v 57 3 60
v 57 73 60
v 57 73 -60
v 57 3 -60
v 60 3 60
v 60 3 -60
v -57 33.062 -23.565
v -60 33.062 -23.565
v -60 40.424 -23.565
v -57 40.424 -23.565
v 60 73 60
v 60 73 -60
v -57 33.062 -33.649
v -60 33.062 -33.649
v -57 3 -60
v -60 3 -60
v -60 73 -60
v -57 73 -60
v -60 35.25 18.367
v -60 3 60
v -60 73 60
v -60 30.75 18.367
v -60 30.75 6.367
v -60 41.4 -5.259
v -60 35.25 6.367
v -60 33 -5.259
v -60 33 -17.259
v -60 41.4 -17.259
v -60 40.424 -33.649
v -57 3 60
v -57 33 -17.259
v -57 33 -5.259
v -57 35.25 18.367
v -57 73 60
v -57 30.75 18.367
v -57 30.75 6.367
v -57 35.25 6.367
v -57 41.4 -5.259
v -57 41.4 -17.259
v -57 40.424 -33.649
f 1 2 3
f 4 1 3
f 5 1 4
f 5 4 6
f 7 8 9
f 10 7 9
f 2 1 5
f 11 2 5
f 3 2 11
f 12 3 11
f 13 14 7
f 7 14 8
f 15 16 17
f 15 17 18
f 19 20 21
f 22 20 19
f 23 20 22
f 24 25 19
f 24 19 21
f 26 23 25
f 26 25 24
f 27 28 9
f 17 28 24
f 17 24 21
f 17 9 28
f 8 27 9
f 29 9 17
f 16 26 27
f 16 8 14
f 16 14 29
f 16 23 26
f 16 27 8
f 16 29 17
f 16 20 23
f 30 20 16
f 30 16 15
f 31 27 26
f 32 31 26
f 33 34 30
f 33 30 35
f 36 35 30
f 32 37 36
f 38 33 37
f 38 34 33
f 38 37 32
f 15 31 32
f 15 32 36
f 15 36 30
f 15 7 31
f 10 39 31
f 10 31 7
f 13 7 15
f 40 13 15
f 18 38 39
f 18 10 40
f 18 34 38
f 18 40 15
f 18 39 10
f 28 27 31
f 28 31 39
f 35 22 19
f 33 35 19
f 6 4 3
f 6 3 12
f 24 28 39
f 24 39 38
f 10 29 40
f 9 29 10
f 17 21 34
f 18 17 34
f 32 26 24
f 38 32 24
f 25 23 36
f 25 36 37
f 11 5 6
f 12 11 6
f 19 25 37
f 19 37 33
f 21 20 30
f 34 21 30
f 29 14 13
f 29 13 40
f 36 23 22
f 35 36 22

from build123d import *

# Parameters (mm, degrees)
SKETCH1_W           = 140
SKETCH1_H           = 160
BOSS_EXTRUDE1_DEPTH = 3
SKETCH2_W           = 120
SKETCH2_H           = 120
SKETCH2_W_2         = 114
SKETCH2_H_2         = 114
BOSS_EXTRUDE2_DEPTH = 70
SKETCH4_W           = 120
SKETCH4_H           = 120
BOSS_EXTRUDE4_DEPTH = 3
SKETCH5_R           = 2.1
SKETCH5_W           = 39.9
SKETCH5_H           = 19.71
CUT_EXTRUDE2_DEPTH  = 3
SKETCH6_W           = 18.298163042
SKETCH6_H           = 17.309993256
CUT_EXTRUDE3_DEPTH  = 3
CUT_EXTRUDE8_DEPTH  = 5
SKETCH15_W          = 259.021634325
SKETCH15_H          = 180.269434884
BOSS_EXTRUDE5_DEPTH = 3
SKETCH18_R          = 1.6
CUT_EXTRUDE9_DEPTH  = 10
SKETCH19_W          = 12
SKETCH19_H          = 4.5
SKETCH19_H_2        = 8.4
SKETCH19_W_2        = 10.084057066
SKETCH19_H_3        = 7.362028533
CUT_EXTRUDE11_DEPTH = 5
SKETCH20_W          = 263.921538054
SKETCH20_H          = 19.630552878
SKETCH20_W_2        = 120
SKETCH20_H_2        = 3
CUT_EXTRUDE12_DEPTH = 233.259150239
SKETCH21_W          = 259.021634325
SKETCH21_H          = 40.269434884
CUT_EXTRUDE13_DEPTH = 209.619923406
SKETCH22_W          = 114
SKETCH22_H          = 125.782417664
CUT_EXTRUDE14_DEPTH = 111


with BuildPart() as part:
    # Sketch1 → Boss-Extrude1 (new body)
    with BuildSketch(Plane(origin=(0, 0, 0), x_dir=(1, 0, 0), z_dir=(0, 1, 0))):
        Rectangle(SKETCH1_W, SKETCH1_H)
    extrude(amount=BOSS_EXTRUDE1_DEPTH)

    # Sketch2 → Boss-Extrude2 (add)
    with BuildSketch(Plane(origin=(0, 3, 0), x_dir=(1, 0, 0), z_dir=(0, 1, 0))):
        Rectangle(SKETCH2_W, SKETCH2_H)
        Rectangle(SKETCH2_W_2, SKETCH2_H_2, mode=Mode.SUBTRACT)
    extrude(amount=BOSS_EXTRUDE2_DEPTH)

    # Sketch4 → Boss-Extrude4 (add)
    with BuildSketch(Plane(origin=(0, 73, 0), x_dir=(1, 0, 0), z_dir=(0, 1, 0))):
        Rectangle(SKETCH4_W, SKETCH4_H)
    extrude(amount=BOSS_EXTRUDE4_DEPTH)

    # Sketch5 → Cut-Extrude2 (cut)
    with BuildSketch(Plane(origin=(0, 76, 0), x_dir=(1, 0, 0), z_dir=(0, 1, 0))):
        with Locations(Location((34.39, -4.925, 0), (0, 0, 270))):
            Circle(SKETCH5_R)
        with Locations(Location((34.39, 4.925, 0), (0, 0, 270))):
            Circle(SKETCH5_R)
        with Locations(Location((-15.03, -4.925, 0), (0, 0, 270))):
            Circle(SKETCH5_R)
        with Locations(Location((-15.03, 4.925, 0), (0, 0, 270))):
            Circle(SKETCH5_R)
        with Locations((9.68, 0)):
            Rectangle(SKETCH5_W, SKETCH5_H)
    extrude(amount=-CUT_EXTRUDE2_DEPTH, mode=Mode.SUBTRACT)

    # Sketch6 → Cut-Extrude3 (cut)
    with BuildSketch(Plane(origin=(0, 76, 0), x_dir=(1, 0, 0), z_dir=(0, 1, 0))):
        Rectangle(SKETCH6_W, SKETCH6_H)
    extrude(amount=-CUT_EXTRUDE3_DEPTH, mode=Mode.SUBTRACT)

    # Sketch13 → Cut-Extrude8 (cut)
    with BuildSketch(Plane(origin=(0, 76, 0), x_dir=(1, 0, 0), z_dir=(0, 1, 0))):
        with BuildLine():
            ThreePointArc((-3.792582359, 49.728765052), (-53.491503795, -1.722579942), (-0.349490011, -49.609426409))
            ThreePointArc((-0.349490011, -49.609426409), (5.82592347, -42.51288634), (-1.270616599, -36.337472859))
            ThreePointArc((-1.270616599, -36.337472859), (-40.195607742, -1.261740085), (-3.792582359, 36.42488497))
            ThreePointArc((-3.792582359, 36.42488497), (2.859357682, 43.076825011), (-3.792582359, 49.728765052))
        make_face()
    extrude(amount=-CUT_EXTRUDE8_DEPTH, mode=Mode.SUBTRACT)

    # Sketch15 → Boss-Extrude5 (add)
    with BuildSketch(Plane(origin=(0, 3, 0), x_dir=(1, 0, 0), z_dir=(0, 1, 0))):
        with Locations((-39.510817163, -10.134717442)):
            Rectangle(SKETCH15_W, SKETCH15_H)
    extrude(amount=-BOSS_EXTRUDE5_DEPTH)

    # Sketch18 → Cut-Extrude9 (cut)
    with BuildSketch(Plane(origin=(0, 3, 0), x_dir=(1, 0, 0), z_dir=(0, 1, 0))):
        with Locations(Location((-55.452, -27.227420358, 0), (0, 0, 194.647469308))):
            Circle(SKETCH18_R)
        with Locations(Location((-55.452, 32.208579642, 0), (0, 0, 194.647469308))):
            Circle(SKETCH18_R)
        with Locations(Location((4.746, 32.208579642, 0), (0, 0, 270))):
            Circle(SKETCH18_R)
        with Locations(Location((4.746, -27.227420358, 0), (0, 0, 270))):
            Circle(SKETCH18_R)
    extrude(amount=-CUT_EXTRUDE9_DEPTH, mode=Mode.SUBTRACT)

    # Sketch19 → Cut-Extrude11 (cut)
    with BuildSketch(Plane.ZY.offset(60)):
        with Locations((12.367420358, 33)):
            Rectangle(SKETCH19_W, SKETCH19_H)
        with Locations((-11.259414931, 37.2)):
            Rectangle(SKETCH19_W, SKETCH19_H_2)
        with Locations((-28.606781654, 36.742945388)):
            Rectangle(SKETCH19_W_2, SKETCH19_H_3)
    extrude(amount=-CUT_EXTRUDE11_DEPTH, mode=Mode.SUBTRACT)

    # Sketch20 → Cut-Extrude12 (cut, through all)
    with BuildSketch(Plane.XY.offset(60)):
        with Locations((-37.060865298, -6.815276439)):
            Rectangle(SKETCH20_W, SKETCH20_H)
        with Locations((0, 74.5)):
            Rectangle(SKETCH20_W_2, SKETCH20_H_2)
    extrude(amount=-CUT_EXTRUDE12_DEPTH, mode=Mode.SUBTRACT)


with BuildPart() as cut_extrude12_piece_1:
    # of the separate pieces the step leaves, piece 1, a body of its own (cut_extrude12_pieces)
    add(part.part.solids().sort_by_distance((60, 73, 60))[0])

    # Sketch22 → Cut-Extrude14 (cut, through all)
    with BuildSketch(Plane(origin=(0, 73, 0), x_dir=(1, 0, 0), z_dir=(0, 1, 0))):
        with Locations((0, -2.891208832)):
            Rectangle(SKETCH22_W, SKETCH22_H)
    extrude(amount=-CUT_EXTRUDE14_DEPTH, mode=Mode.SUBTRACT)


with BuildPart() as cut_extrude12_piece_2:
    # of the separate pieces the step leaves, piece 2, a body of its own (cut_extrude12_pieces)
    add(part.part.solids().sort_by_distance((90, 0, 60))[0])

    # Sketch21 → Cut-Extrude13 (cut, through all)
    with BuildSketch(Plane(origin=(0, 3, 0), x_dir=(1, 0, 0), z_dir=(0, 1, 0))):
        with Locations((-39.510817163, -80.134717442)):
            Rectangle(SKETCH21_W, SKETCH21_H)
    extrude(amount=-CUT_EXTRUDE13_DEPTH, mode=Mode.SUBTRACT)


with BuildPart() as cut_extrude14_piece_1:
    # of the separate pieces the step leaves, piece 1, a body of its own (cut_extrude14_pieces)
    add(cut_extrude12_piece_1.part.solids().sort_by_distance((60, 73, 60))[0])


with BuildPart() as cut_extrude14_piece_2:
    # of the separate pieces the step leaves, piece 2, a body of its own (cut_extrude14_pieces)
    add(cut_extrude12_piece_1.part.solids().sort_by_distance((-57, 3, 60))[0])


solid = Compound([cut_extrude14_piece_1.part, cut_extrude14_piece_2.part])
